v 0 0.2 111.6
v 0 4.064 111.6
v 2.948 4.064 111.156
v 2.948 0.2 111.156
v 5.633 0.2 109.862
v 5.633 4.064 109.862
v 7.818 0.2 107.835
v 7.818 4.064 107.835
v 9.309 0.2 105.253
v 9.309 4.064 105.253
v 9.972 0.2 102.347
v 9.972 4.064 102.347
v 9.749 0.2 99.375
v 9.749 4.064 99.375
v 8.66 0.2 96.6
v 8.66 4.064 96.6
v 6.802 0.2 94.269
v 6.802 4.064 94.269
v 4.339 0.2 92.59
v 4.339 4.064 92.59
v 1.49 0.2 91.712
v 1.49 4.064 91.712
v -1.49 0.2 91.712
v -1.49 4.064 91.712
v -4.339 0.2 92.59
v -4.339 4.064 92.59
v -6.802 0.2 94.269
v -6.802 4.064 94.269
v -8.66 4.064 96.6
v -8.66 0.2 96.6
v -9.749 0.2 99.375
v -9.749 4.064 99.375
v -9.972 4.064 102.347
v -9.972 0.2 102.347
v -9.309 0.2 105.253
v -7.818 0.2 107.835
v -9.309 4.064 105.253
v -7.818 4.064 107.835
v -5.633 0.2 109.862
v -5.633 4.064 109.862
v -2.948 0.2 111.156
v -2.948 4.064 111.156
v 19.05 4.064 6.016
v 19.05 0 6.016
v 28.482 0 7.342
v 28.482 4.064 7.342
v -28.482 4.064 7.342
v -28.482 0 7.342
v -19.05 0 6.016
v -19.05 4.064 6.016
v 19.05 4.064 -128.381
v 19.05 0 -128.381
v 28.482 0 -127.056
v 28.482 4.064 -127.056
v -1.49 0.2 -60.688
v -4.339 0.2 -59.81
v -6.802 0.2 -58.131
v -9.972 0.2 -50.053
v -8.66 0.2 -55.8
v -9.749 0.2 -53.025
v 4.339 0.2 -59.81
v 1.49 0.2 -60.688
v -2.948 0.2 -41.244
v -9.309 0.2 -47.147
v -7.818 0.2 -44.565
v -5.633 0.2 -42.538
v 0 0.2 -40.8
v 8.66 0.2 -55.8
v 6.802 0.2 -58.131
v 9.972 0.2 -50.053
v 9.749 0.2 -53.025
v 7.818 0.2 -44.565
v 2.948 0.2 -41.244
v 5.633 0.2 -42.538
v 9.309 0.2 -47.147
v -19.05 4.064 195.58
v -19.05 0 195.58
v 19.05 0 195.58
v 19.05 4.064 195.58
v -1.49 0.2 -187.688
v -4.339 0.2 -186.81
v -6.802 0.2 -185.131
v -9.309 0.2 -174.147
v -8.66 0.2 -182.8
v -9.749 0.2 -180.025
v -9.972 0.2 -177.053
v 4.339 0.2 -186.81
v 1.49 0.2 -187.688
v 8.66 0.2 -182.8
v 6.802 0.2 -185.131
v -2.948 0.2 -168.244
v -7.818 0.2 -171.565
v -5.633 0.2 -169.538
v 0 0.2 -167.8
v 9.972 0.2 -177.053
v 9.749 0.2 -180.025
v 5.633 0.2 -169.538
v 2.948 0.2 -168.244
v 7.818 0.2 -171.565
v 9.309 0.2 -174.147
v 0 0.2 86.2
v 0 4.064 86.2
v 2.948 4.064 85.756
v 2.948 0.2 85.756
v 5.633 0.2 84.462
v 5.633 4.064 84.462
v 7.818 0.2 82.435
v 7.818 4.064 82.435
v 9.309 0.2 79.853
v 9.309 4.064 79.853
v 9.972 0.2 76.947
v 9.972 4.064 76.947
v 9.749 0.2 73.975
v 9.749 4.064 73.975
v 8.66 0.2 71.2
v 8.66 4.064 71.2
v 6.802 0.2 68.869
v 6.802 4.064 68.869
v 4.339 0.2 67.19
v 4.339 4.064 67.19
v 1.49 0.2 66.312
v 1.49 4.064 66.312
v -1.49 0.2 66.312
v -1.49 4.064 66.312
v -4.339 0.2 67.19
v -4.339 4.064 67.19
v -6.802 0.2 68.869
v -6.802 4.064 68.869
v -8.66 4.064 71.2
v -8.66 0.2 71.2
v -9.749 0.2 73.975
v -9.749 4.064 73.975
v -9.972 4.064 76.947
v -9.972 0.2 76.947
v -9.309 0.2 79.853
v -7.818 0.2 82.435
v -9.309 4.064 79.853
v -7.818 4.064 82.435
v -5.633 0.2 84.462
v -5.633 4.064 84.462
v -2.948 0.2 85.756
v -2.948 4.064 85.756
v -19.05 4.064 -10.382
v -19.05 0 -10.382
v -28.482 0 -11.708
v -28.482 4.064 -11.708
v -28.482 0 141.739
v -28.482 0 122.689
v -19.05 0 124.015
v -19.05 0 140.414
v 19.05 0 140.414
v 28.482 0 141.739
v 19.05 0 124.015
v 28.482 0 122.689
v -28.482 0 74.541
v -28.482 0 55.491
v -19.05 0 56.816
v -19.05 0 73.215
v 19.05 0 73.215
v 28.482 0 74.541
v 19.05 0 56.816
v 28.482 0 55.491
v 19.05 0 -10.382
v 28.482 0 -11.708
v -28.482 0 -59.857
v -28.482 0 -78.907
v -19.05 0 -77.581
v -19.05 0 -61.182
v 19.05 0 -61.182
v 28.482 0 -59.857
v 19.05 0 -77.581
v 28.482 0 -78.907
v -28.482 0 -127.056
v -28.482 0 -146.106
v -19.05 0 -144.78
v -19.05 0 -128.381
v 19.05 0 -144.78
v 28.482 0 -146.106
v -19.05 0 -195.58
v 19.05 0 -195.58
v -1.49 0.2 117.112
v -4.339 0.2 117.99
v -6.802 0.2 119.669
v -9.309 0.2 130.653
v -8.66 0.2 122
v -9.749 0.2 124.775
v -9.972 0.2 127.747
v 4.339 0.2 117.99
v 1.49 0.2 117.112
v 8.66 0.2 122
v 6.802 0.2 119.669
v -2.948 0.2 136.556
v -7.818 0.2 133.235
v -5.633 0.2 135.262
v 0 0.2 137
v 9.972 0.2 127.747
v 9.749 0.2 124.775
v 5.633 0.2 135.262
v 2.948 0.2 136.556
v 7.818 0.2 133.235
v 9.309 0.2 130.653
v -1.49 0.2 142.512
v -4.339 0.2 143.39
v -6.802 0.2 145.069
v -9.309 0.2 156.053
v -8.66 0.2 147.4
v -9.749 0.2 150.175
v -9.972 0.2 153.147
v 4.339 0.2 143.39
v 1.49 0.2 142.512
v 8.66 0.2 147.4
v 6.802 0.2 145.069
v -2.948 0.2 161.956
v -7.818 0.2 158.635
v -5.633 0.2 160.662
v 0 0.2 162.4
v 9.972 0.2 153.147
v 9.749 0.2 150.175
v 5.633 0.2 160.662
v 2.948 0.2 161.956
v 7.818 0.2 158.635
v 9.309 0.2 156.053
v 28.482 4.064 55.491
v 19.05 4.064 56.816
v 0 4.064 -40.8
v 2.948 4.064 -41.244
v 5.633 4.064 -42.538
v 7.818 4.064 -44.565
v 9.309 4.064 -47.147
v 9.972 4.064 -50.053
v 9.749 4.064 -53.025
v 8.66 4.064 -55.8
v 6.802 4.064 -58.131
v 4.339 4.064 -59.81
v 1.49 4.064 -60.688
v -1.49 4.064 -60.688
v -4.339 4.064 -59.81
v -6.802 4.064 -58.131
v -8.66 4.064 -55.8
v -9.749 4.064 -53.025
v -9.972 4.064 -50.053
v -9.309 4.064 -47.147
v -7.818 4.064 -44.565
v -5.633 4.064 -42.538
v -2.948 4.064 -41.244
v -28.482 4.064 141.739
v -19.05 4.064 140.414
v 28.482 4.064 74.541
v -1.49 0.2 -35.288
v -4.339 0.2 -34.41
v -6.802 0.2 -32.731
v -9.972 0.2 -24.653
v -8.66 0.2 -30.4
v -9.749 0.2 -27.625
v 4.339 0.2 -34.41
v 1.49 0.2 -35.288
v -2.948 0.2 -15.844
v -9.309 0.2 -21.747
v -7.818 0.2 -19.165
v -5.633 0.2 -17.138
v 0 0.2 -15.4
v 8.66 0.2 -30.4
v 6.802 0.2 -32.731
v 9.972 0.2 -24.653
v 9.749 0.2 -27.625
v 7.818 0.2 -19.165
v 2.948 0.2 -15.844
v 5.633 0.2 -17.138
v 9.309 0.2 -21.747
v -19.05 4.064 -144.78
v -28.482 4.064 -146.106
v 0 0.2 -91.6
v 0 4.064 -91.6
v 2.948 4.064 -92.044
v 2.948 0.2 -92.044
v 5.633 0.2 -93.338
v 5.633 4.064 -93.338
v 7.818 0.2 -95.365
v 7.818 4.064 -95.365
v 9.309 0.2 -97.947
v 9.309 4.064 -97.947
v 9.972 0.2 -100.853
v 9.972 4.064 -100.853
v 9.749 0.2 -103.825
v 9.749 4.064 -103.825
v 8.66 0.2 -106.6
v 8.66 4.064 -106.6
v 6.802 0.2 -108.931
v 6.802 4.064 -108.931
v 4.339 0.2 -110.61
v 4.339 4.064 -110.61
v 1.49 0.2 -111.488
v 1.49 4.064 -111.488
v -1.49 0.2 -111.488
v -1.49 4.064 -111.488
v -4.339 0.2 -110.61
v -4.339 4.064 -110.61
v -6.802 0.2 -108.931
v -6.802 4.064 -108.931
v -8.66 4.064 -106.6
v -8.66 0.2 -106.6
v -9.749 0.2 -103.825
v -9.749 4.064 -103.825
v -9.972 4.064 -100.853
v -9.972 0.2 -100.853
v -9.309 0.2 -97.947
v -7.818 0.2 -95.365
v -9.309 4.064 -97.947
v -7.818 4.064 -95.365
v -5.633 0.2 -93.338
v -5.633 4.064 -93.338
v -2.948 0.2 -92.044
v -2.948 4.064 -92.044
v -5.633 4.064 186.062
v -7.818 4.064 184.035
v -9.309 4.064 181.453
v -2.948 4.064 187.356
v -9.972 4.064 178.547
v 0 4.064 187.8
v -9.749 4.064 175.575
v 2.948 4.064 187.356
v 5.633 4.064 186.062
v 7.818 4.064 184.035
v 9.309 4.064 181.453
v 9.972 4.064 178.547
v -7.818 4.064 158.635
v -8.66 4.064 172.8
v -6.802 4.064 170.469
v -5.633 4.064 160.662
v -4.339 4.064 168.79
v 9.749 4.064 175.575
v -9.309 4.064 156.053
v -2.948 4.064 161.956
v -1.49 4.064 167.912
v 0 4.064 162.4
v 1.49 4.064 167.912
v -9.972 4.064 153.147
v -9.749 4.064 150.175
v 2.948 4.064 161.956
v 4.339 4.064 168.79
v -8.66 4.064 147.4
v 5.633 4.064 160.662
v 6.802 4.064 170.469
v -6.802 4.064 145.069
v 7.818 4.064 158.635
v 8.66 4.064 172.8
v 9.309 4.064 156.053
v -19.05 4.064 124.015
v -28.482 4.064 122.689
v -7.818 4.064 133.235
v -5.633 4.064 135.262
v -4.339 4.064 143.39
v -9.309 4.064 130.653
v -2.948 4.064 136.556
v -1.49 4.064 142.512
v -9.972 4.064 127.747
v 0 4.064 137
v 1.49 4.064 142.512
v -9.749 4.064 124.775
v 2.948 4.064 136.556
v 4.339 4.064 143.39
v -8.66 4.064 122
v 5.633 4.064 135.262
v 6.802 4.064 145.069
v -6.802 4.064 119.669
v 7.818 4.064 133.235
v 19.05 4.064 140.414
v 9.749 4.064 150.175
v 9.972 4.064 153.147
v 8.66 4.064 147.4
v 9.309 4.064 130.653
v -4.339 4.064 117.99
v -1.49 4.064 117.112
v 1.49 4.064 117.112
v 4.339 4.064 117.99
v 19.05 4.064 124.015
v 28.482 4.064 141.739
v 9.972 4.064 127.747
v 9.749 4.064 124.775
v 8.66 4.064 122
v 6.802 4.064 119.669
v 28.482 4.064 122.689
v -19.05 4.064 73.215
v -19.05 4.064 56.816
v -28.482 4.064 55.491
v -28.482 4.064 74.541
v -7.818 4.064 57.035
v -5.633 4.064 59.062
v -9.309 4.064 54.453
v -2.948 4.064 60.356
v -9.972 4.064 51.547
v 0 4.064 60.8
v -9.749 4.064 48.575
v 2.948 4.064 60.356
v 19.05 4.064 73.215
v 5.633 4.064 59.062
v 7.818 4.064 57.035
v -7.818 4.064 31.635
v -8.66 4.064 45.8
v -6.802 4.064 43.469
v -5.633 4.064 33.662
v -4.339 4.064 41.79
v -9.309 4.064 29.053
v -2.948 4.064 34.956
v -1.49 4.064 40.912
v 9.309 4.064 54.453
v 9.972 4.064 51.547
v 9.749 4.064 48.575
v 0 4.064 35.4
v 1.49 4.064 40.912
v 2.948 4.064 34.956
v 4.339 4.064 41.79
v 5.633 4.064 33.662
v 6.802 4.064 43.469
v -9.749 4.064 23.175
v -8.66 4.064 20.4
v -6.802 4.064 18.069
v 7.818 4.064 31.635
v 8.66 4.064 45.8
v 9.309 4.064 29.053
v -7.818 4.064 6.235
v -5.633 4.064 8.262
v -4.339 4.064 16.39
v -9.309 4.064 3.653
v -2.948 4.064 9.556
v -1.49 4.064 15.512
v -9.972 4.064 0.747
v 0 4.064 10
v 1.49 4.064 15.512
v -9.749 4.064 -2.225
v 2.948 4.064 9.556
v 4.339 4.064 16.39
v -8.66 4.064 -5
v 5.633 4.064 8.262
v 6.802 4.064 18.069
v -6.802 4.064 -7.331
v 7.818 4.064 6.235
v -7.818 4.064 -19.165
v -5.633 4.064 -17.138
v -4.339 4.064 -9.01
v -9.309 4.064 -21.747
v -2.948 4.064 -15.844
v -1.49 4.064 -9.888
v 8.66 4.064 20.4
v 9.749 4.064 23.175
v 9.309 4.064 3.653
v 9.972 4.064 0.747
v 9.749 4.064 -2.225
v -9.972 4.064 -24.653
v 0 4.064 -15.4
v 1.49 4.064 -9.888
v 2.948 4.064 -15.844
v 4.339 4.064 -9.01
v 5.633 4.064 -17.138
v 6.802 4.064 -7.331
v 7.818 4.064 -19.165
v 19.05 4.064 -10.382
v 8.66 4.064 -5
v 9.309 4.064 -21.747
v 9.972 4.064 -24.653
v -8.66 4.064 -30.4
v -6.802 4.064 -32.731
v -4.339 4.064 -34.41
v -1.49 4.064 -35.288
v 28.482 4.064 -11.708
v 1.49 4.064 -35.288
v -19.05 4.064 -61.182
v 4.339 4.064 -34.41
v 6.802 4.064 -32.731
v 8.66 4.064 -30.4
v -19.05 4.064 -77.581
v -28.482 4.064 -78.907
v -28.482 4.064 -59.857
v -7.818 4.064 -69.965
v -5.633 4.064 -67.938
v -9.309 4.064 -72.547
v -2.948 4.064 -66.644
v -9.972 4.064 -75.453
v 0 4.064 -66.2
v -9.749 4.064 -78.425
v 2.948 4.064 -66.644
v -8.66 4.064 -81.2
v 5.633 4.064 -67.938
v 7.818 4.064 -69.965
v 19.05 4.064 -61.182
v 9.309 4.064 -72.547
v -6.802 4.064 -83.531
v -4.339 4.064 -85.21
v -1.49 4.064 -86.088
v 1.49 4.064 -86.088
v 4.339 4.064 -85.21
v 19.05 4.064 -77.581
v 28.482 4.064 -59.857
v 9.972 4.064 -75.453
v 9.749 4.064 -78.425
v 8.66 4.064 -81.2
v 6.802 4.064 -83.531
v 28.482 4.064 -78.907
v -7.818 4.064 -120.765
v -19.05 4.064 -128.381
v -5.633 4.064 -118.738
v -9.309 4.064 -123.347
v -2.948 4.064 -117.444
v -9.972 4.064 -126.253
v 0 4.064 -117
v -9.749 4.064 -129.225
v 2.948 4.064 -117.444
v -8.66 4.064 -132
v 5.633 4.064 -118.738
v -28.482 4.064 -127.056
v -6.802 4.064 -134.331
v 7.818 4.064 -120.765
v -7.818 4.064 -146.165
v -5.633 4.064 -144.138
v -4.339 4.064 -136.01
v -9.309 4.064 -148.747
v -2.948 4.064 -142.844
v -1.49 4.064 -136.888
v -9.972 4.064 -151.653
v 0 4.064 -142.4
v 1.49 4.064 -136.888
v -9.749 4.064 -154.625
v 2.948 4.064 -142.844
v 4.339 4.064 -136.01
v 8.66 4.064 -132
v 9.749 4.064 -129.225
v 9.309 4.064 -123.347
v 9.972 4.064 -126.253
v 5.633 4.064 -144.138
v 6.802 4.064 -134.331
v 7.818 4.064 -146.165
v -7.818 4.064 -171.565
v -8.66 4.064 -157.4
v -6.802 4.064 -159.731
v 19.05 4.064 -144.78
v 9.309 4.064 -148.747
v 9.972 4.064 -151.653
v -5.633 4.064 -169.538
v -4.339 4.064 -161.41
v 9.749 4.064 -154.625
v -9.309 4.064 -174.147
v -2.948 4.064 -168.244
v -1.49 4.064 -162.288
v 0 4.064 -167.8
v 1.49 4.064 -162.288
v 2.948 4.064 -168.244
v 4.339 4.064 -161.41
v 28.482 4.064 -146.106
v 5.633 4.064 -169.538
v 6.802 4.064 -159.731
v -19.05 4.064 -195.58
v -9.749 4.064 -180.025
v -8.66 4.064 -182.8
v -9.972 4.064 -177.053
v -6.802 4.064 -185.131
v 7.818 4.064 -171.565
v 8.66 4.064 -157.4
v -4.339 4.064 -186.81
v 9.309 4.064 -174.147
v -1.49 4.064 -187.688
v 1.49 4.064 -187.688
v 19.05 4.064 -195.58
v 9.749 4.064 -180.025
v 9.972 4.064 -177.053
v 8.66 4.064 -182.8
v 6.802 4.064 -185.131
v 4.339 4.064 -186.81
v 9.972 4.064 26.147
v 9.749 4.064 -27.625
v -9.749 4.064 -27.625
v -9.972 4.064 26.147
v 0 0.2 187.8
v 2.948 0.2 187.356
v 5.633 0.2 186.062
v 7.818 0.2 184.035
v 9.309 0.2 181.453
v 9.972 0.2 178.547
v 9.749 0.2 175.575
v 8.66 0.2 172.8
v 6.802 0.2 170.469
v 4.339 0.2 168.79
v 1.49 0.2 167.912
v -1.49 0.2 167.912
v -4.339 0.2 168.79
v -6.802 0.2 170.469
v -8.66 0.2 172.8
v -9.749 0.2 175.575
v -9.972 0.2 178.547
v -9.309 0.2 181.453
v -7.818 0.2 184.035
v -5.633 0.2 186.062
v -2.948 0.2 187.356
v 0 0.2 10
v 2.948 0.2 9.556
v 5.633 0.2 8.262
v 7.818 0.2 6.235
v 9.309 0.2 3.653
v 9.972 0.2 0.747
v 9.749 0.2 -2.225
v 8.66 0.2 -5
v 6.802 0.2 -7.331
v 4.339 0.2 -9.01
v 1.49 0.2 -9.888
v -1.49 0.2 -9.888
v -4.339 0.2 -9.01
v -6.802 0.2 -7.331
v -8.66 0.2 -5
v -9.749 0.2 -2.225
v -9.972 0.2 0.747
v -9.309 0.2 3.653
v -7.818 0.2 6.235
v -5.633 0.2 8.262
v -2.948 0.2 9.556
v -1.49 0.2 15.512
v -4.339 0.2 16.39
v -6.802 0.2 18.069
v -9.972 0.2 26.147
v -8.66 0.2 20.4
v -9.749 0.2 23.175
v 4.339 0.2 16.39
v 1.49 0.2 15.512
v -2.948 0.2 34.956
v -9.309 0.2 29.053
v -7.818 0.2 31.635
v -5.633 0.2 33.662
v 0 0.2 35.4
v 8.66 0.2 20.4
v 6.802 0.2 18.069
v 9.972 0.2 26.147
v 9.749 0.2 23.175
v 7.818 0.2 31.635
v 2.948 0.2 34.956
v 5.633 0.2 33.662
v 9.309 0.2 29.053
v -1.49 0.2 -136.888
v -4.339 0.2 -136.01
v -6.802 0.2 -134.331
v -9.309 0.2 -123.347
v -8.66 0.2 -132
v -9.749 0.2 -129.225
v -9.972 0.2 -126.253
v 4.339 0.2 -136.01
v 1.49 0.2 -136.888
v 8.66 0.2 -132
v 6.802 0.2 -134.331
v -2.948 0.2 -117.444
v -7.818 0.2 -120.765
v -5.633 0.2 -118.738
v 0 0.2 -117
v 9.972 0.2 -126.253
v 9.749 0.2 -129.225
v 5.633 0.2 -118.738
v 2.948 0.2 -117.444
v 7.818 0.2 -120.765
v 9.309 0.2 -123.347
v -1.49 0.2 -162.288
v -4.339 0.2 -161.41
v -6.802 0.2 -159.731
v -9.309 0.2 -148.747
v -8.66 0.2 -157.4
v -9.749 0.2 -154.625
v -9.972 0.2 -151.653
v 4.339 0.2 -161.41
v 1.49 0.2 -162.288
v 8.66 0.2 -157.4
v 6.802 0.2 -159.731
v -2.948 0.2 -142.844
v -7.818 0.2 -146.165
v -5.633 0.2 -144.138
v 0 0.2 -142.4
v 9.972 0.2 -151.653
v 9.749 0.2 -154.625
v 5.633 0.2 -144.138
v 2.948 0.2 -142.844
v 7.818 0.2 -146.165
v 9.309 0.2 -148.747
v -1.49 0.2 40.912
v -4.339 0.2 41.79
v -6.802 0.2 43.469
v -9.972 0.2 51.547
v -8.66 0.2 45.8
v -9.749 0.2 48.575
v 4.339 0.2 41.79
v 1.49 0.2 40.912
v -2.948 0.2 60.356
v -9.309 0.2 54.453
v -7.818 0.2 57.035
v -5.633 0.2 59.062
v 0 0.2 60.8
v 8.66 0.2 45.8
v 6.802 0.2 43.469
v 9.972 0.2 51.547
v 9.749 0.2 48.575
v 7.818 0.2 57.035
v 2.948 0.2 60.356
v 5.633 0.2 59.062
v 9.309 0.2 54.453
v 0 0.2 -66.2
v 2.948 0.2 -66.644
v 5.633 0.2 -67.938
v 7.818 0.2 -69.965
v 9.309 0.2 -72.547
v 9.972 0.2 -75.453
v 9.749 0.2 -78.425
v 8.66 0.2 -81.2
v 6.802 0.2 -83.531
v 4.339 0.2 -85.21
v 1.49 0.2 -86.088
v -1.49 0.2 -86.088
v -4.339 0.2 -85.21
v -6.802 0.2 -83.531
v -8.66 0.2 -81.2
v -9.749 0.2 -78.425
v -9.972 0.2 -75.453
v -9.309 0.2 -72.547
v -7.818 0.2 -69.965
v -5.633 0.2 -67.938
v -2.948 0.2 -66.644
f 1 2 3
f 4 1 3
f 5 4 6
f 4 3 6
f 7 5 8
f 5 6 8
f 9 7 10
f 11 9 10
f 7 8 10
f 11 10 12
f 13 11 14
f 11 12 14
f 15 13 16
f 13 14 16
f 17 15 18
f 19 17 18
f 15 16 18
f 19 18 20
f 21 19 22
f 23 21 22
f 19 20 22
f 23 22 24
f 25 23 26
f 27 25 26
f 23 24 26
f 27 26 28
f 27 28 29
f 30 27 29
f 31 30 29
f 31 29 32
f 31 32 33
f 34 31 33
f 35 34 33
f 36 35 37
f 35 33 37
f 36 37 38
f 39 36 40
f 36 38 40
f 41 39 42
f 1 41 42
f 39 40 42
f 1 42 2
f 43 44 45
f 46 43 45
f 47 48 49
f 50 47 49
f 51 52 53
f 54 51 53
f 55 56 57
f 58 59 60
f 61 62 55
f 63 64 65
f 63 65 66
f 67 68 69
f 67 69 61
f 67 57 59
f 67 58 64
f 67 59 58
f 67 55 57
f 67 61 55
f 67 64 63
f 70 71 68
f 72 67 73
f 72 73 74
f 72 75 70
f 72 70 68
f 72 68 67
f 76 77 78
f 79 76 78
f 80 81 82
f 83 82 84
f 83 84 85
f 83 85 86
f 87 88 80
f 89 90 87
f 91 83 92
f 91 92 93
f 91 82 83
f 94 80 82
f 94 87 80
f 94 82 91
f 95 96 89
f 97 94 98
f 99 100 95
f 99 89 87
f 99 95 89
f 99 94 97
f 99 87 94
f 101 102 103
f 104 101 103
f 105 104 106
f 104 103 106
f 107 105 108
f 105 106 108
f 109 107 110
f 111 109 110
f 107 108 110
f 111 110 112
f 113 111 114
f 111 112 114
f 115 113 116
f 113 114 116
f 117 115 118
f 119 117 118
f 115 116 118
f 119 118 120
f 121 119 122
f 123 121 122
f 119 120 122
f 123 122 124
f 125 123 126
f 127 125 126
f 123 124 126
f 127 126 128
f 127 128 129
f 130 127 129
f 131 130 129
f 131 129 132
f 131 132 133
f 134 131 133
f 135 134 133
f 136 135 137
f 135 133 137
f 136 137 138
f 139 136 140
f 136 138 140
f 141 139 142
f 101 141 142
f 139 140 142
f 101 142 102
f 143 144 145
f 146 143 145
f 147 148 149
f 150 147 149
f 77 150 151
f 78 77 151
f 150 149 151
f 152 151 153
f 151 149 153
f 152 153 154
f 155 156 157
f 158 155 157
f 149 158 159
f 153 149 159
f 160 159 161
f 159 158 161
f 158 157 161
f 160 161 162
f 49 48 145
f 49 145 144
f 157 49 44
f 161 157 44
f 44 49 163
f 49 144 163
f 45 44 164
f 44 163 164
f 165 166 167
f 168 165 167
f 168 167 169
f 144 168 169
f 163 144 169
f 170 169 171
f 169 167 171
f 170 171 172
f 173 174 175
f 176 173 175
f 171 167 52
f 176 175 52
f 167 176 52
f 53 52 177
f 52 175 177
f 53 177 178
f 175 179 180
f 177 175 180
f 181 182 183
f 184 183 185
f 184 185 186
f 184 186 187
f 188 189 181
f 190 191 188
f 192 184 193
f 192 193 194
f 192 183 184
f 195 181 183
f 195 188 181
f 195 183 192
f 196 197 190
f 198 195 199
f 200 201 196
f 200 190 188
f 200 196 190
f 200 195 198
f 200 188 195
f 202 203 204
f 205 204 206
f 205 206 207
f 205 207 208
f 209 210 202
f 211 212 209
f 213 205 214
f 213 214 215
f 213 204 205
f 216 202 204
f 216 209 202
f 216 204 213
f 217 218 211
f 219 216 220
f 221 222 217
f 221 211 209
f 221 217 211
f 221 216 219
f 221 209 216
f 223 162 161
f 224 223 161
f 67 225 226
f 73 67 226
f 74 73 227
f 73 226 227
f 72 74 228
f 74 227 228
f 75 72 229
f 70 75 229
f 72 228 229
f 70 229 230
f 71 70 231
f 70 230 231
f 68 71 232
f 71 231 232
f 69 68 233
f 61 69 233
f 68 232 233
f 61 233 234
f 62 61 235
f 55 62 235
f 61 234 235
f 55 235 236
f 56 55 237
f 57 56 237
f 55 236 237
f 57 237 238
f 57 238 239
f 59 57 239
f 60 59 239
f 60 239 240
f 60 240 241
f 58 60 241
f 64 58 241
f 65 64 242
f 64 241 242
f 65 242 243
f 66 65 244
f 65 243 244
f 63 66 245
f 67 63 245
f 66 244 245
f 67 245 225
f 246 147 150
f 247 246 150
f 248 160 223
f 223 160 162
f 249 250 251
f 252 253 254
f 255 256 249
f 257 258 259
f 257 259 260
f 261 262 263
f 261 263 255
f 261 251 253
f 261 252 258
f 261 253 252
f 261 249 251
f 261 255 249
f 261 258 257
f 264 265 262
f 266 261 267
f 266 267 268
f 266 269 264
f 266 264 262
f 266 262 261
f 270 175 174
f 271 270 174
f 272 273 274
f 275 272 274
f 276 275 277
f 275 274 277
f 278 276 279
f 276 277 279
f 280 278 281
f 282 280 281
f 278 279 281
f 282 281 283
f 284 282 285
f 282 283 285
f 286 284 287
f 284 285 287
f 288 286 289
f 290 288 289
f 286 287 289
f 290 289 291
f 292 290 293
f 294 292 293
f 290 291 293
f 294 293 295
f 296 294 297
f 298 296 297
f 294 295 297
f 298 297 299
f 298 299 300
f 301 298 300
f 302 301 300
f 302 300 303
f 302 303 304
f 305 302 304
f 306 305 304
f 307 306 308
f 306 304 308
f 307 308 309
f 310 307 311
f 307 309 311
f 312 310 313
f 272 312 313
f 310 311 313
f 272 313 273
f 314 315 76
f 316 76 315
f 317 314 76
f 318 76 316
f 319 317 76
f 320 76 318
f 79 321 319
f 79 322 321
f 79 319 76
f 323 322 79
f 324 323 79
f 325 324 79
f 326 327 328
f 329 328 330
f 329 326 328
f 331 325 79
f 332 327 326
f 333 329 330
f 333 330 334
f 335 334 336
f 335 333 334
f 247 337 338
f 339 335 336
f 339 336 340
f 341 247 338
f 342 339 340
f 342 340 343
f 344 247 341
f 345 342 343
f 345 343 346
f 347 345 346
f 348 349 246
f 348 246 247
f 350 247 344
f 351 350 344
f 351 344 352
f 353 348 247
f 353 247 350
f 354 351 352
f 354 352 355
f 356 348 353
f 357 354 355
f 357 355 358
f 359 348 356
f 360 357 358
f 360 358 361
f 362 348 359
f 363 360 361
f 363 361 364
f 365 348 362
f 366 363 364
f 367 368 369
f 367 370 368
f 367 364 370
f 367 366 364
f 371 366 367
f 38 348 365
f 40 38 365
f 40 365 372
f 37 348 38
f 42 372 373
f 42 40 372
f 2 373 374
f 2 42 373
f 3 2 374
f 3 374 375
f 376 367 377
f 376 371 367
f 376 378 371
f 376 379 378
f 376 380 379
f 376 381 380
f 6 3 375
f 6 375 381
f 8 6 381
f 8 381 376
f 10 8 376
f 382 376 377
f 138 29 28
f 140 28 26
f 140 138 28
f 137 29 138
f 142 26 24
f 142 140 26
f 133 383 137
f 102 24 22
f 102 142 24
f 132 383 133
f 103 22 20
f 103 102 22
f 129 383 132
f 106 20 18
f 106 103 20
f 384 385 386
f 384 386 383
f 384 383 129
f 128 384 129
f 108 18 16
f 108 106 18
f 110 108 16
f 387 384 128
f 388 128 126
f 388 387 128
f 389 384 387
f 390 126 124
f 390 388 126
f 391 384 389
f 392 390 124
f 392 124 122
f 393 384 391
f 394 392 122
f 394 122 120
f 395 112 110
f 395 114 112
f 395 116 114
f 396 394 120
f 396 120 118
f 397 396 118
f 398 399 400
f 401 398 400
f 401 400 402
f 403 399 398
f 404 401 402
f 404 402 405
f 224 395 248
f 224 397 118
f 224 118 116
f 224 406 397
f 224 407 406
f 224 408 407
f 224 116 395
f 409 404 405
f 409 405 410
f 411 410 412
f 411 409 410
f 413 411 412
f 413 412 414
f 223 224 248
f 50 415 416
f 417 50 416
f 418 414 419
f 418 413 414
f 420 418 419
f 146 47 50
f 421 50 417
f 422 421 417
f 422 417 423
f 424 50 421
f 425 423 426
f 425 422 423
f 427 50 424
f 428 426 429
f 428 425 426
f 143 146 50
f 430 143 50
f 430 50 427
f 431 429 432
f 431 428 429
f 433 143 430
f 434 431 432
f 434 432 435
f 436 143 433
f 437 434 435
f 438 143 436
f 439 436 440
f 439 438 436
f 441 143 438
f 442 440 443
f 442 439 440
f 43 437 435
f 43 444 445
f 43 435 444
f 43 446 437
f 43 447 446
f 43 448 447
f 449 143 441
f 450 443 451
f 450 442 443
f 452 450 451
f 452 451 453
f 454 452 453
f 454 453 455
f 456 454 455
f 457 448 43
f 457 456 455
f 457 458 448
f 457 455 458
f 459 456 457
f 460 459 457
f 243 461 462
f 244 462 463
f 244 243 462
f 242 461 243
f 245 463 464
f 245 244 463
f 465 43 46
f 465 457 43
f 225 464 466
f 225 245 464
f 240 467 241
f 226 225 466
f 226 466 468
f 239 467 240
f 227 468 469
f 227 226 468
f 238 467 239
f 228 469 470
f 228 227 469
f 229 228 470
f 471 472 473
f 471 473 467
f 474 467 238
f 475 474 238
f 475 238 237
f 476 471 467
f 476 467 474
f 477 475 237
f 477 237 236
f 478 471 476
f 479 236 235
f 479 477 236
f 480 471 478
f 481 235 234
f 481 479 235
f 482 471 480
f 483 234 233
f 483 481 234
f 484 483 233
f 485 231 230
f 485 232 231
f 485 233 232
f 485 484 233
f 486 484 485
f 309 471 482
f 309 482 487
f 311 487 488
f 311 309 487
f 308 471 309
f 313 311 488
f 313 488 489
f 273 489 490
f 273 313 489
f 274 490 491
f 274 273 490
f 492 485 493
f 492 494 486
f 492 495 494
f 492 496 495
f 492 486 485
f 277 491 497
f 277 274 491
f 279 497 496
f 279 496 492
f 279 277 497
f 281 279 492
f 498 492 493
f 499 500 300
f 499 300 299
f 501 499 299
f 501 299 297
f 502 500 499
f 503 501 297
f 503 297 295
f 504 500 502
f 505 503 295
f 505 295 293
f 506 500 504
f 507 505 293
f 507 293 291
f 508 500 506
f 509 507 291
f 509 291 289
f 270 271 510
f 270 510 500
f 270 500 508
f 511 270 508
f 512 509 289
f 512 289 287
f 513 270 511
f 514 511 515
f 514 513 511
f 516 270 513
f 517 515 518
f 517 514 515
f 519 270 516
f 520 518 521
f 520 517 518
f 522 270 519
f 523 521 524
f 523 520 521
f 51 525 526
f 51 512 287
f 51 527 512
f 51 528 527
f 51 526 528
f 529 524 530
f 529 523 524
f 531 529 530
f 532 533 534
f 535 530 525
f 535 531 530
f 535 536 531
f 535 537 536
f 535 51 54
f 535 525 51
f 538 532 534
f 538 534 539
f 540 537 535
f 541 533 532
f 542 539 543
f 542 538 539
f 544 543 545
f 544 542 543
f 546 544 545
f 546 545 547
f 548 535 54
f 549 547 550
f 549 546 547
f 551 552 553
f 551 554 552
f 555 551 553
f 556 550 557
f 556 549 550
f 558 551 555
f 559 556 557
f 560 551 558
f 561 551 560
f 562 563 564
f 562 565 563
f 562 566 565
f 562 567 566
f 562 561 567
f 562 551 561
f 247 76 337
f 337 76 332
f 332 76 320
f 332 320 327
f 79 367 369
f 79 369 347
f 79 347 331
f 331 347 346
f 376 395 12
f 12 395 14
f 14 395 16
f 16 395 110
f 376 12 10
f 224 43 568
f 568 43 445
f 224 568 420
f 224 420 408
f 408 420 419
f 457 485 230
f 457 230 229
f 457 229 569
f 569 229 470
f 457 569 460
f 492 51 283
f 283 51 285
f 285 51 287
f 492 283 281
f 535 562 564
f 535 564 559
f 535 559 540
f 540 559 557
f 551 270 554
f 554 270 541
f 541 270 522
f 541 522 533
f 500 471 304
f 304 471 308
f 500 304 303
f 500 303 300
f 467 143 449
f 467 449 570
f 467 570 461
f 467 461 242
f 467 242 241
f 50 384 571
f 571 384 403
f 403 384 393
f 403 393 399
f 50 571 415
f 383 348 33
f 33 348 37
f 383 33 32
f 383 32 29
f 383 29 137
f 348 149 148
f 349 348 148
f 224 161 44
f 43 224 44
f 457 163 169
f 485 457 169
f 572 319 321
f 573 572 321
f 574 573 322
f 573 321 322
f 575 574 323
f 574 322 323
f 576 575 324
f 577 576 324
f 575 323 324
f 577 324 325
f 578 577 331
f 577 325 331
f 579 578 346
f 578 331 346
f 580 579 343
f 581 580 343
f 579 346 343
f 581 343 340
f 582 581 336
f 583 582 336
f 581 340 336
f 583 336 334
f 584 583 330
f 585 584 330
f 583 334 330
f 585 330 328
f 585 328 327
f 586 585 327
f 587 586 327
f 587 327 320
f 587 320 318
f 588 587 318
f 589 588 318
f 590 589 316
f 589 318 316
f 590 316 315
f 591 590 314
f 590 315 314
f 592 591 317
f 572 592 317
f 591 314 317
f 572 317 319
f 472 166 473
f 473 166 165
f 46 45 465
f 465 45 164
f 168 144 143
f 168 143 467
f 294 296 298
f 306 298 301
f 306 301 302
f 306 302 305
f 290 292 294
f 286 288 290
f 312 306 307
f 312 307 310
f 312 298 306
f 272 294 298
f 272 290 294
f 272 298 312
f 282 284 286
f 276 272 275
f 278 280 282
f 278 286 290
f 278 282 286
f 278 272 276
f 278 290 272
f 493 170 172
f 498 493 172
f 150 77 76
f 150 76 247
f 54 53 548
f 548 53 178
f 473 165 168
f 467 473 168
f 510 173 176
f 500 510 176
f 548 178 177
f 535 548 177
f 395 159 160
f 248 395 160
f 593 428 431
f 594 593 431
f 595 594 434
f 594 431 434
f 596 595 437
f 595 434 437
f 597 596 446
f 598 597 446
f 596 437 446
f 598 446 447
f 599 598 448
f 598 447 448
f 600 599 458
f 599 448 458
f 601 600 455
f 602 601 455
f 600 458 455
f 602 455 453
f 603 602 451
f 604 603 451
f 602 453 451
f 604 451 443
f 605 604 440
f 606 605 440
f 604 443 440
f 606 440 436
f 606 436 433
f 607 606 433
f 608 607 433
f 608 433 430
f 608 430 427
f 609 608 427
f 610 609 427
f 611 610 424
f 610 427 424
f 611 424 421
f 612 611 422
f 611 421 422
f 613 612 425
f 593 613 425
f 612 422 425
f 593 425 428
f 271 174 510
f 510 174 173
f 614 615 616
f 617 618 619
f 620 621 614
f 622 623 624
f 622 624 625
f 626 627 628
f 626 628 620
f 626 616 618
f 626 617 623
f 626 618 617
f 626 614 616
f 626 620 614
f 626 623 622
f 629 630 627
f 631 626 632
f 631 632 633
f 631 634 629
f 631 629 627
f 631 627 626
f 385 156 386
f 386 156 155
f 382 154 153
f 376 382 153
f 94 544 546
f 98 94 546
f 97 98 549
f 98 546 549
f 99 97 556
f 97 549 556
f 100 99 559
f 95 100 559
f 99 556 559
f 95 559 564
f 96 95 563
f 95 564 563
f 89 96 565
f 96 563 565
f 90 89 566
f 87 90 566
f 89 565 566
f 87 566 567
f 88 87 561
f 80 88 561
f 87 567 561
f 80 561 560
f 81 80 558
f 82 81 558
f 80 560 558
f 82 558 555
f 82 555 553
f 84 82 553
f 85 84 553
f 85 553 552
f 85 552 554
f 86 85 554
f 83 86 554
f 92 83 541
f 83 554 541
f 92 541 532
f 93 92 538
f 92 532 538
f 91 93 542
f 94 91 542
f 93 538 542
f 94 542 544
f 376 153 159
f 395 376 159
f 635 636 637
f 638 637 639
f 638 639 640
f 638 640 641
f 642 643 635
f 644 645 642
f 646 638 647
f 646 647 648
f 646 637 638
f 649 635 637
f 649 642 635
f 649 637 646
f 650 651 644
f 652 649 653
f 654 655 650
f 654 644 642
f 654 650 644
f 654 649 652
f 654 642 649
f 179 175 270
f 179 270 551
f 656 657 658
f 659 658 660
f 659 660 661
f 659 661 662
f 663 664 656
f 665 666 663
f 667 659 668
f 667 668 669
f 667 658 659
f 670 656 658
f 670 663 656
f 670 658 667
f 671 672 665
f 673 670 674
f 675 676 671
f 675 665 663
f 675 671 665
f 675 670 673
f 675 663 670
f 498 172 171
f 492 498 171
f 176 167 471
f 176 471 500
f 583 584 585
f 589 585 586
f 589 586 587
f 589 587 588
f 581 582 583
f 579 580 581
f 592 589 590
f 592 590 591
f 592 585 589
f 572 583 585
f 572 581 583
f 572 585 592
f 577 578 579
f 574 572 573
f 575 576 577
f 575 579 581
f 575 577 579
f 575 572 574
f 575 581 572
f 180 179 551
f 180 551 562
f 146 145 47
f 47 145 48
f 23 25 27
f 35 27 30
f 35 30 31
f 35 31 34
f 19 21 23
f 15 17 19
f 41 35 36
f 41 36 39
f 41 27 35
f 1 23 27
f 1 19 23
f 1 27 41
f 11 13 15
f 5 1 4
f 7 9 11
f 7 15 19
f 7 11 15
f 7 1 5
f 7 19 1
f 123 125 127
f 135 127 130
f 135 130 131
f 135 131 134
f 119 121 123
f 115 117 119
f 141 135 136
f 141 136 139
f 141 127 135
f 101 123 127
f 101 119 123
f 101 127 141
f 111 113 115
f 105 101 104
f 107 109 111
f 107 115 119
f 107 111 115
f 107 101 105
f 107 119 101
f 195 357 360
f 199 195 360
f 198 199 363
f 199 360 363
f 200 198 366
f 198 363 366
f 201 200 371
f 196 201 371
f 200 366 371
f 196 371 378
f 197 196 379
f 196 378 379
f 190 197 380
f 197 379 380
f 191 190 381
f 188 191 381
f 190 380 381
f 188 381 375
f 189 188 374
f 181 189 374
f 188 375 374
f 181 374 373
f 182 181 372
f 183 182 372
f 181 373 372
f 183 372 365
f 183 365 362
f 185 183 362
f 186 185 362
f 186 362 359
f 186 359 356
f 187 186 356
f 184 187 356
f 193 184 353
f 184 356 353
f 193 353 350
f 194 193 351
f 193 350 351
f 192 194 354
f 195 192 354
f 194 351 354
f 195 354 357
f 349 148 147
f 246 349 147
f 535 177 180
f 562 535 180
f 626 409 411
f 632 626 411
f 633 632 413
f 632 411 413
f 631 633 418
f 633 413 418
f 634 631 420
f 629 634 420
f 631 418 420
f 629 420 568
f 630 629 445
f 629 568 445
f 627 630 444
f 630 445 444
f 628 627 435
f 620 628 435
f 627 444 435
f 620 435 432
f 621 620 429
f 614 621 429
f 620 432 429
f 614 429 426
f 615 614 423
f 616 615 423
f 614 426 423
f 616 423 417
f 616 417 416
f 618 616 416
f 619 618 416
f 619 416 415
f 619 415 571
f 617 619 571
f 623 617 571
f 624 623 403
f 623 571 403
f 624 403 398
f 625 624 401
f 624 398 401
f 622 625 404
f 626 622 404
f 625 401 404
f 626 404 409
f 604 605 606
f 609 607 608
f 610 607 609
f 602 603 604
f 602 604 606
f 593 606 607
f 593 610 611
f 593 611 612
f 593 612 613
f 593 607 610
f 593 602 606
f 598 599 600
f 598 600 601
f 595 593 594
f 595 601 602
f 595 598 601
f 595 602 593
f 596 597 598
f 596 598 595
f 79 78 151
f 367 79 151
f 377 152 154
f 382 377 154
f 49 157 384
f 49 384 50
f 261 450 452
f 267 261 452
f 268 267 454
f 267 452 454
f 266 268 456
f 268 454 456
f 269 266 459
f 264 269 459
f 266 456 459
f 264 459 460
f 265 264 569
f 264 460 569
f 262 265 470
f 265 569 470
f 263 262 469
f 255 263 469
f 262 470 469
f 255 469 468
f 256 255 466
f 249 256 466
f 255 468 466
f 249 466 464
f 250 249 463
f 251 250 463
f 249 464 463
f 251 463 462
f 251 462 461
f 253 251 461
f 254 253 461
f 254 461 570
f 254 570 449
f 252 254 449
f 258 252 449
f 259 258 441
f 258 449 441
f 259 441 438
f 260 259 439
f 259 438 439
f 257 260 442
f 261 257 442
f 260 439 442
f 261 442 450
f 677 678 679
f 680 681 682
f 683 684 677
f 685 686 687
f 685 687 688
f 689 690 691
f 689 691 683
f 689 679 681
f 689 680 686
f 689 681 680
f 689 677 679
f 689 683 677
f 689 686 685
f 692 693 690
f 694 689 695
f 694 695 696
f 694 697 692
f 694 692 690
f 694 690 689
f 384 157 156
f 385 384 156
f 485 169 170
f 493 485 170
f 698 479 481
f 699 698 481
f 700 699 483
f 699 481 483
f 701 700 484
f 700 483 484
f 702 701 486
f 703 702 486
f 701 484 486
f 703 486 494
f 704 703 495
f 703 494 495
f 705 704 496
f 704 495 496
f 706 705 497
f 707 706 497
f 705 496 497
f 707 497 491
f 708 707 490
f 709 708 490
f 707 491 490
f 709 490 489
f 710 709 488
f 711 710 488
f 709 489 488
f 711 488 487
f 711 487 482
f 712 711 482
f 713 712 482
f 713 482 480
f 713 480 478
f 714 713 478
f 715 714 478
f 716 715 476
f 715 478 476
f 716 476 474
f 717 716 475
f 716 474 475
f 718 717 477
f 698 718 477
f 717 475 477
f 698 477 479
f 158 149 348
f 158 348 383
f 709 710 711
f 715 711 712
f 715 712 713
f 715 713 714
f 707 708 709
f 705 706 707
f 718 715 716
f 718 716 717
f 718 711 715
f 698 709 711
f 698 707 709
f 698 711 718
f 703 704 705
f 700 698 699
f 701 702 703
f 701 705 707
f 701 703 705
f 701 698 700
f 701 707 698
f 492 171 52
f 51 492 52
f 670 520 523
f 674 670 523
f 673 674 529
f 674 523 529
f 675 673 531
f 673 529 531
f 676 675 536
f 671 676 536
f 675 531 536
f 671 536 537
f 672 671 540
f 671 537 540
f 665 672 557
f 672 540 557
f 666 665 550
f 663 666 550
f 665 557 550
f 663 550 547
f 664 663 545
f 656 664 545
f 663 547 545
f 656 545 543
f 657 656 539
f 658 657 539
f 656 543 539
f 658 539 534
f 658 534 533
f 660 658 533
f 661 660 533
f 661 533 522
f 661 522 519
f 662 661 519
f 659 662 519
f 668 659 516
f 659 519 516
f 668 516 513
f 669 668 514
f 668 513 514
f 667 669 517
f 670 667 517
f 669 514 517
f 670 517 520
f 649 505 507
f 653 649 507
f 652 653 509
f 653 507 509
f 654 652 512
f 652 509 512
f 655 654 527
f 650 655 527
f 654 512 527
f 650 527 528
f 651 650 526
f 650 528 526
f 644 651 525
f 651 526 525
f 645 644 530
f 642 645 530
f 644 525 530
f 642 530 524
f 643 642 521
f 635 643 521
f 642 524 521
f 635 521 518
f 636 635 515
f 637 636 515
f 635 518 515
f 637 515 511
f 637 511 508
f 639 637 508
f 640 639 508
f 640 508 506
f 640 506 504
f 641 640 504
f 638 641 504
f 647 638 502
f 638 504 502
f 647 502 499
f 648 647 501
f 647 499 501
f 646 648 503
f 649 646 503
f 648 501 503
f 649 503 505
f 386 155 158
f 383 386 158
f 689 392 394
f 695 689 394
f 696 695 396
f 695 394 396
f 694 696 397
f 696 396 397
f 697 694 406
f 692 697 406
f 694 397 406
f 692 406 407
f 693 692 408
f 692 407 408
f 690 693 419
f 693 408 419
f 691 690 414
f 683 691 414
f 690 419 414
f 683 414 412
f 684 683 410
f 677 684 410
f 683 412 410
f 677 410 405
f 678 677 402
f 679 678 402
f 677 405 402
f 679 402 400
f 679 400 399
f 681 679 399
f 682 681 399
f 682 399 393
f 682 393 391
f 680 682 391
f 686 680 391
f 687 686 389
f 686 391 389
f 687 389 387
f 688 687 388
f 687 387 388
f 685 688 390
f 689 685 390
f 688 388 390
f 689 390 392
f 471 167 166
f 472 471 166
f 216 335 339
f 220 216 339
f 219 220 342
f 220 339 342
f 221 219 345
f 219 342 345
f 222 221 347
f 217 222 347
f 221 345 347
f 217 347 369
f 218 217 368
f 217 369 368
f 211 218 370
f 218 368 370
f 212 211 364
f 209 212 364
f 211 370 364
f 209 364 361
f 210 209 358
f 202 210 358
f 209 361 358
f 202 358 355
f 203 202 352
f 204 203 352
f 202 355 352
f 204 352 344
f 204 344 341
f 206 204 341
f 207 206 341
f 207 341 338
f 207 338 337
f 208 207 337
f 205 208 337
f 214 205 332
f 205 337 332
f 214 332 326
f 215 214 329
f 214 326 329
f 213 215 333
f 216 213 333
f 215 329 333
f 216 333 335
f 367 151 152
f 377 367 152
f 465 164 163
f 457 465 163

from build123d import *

# Parameters (mm, degrees)
SKETCH1_W           = 38.1
SKETCH1_H           = 391.16
BOSS_EXTRUDE1_DEPTH = 4.064
SKETCH2_R           = 10
CUT_EXTRUDE1_DEPTH  = 3.863999892
BOSS_EXTRUDE2_DEPTH = 4.064


with BuildPart() as part:
    # Sketch1 → Boss-Extrude1 (new body)
    with BuildSketch(Plane(origin=(0, 0, 0), x_dir=(1, 0, 0), z_dir=(0, 1, 0))):
        Rectangle(SKETCH1_W, SKETCH1_H)
    extrude(amount=BOSS_EXTRUDE1_DEPTH)

    # Sketch2 → Cut-Extrude1 (cut)
    with BuildSketch(Plane(origin=(0, 4.064, 0), x_dir=(1, 0, 0), z_dir=(0, 1, 0))):
        with Locations(Location((0, 177.8, 0), (0, 0, 270))):
            Circle(SKETCH2_R)
        with Locations(Location((0, 152.4, 0), (0, 0, 270))):
            Circle(SKETCH2_R)
        with Locations(Location((0, 127, 0), (0, 0, 270))):
            Circle(SKETCH2_R)
        with Locations(Location((0, 101.6, 0), (0, 0, 270))):
            Circle(SKETCH2_R)
        with Locations(Location((0, 76.2, 0), (0, 0, 270))):
            Circle(SKETCH2_R)
        with Locations(Location((0, 50.8, 0), (0, 0, 270))):
            Circle(SKETCH2_R)
        with Locations(Location((0, 25.4, 0), (0, 0, 270))):
            Circle(SKETCH2_R)
        with Locations(Location((0, 0, 0), (0, 0, 270))):
            Circle(SKETCH2_R)
        with Locations(Location((0, -25.4, 0), (0, 0, 270))):
            Circle(SKETCH2_R)
        with Locations(Location((0, -50.8, 0), (0, 0, 270))):
            Circle(SKETCH2_R)
        with Locations(Location((0, -76.2, 0), (0, 0, 270))):
            Circle(SKETCH2_R)
        with Locations(Location((0, -101.6, 0), (0, 0, 270))):
            Circle(SKETCH2_R)
        with Locations(Location((0, -127, 0), (0, 0, 270))):
            Circle(SKETCH2_R)
        with Locations(Location((0, -152.4, 0), (0, 0, 270))):
            Circle(SKETCH2_R)
        with Locations(Location((0, -177.8, 0), (0, 0, 270))):
            Circle(SKETCH2_R)
    extrude(amount=-CUT_EXTRUDE1_DEPTH, mode=Mode.SUBTRACT)

    # Sketch4 → Boss-Extrude2 (add)
    with BuildSketch(Plane(origin=(0, 0, 0), x_dir=(1, 0, 0), z_dir=(0, 1, 0))):
        Polygon((28.482303355, -55.490633493), (19.05, -56.81625728), (19.05, -73.215009707), (28.482303355, -74.540633493), align=None)
        Polygon((28.482303355, 146.105623787), (19.05, 144.78), (19.05, 128.381247573), (28.482303355, 127.055623787), align=None)
        Polygon((-19.05, 128.381247573), (-19.05, 144.78), (-28.482303355, 146.105623787), (-28.482303355, 127.055623787), align=None)
        Polygon((28.482303355, 78.90687136), (19.05, 77.581247573), (19.05, 61.182495147), (28.482303355, 59.85687136), align=None)
        Polygon((28.482303355, 11.708118933), (19.05, 10.382495147), (19.05, -6.01625728), (28.482303355, -7.341881067), align=None)
        Polygon((-19.05, -6.01625728), (-19.05, 10.382495147), (-28.482303355, 11.708118933), (-28.482303355, -7.341881067), align=None)
        Polygon((-19.05, 61.182495147), (-19.05, 77.581247573), (-28.482303355, 78.90687136), (-28.482303355, 59.85687136), align=None)
        Polygon((28.482303355, -122.68938592), (19.05, -124.015009707), (19.05, -140.413762134), (28.482303355, -141.73938592), align=None)
        Polygon((-19.05, -140.413762134), (-19.05, -124.015009707), (-28.482303355, -122.68938592), (-28.482303355, -141.73938592), align=None)
        Polygon((-19.05, -73.215009707), (-19.05, -56.81625728), (-28.482303355, -55.490633493), (-28.482303355, -74.540633493), align=None)
    extrude(amount=BOSS_EXTRUDE2_DEPTH)


solid = part.part
